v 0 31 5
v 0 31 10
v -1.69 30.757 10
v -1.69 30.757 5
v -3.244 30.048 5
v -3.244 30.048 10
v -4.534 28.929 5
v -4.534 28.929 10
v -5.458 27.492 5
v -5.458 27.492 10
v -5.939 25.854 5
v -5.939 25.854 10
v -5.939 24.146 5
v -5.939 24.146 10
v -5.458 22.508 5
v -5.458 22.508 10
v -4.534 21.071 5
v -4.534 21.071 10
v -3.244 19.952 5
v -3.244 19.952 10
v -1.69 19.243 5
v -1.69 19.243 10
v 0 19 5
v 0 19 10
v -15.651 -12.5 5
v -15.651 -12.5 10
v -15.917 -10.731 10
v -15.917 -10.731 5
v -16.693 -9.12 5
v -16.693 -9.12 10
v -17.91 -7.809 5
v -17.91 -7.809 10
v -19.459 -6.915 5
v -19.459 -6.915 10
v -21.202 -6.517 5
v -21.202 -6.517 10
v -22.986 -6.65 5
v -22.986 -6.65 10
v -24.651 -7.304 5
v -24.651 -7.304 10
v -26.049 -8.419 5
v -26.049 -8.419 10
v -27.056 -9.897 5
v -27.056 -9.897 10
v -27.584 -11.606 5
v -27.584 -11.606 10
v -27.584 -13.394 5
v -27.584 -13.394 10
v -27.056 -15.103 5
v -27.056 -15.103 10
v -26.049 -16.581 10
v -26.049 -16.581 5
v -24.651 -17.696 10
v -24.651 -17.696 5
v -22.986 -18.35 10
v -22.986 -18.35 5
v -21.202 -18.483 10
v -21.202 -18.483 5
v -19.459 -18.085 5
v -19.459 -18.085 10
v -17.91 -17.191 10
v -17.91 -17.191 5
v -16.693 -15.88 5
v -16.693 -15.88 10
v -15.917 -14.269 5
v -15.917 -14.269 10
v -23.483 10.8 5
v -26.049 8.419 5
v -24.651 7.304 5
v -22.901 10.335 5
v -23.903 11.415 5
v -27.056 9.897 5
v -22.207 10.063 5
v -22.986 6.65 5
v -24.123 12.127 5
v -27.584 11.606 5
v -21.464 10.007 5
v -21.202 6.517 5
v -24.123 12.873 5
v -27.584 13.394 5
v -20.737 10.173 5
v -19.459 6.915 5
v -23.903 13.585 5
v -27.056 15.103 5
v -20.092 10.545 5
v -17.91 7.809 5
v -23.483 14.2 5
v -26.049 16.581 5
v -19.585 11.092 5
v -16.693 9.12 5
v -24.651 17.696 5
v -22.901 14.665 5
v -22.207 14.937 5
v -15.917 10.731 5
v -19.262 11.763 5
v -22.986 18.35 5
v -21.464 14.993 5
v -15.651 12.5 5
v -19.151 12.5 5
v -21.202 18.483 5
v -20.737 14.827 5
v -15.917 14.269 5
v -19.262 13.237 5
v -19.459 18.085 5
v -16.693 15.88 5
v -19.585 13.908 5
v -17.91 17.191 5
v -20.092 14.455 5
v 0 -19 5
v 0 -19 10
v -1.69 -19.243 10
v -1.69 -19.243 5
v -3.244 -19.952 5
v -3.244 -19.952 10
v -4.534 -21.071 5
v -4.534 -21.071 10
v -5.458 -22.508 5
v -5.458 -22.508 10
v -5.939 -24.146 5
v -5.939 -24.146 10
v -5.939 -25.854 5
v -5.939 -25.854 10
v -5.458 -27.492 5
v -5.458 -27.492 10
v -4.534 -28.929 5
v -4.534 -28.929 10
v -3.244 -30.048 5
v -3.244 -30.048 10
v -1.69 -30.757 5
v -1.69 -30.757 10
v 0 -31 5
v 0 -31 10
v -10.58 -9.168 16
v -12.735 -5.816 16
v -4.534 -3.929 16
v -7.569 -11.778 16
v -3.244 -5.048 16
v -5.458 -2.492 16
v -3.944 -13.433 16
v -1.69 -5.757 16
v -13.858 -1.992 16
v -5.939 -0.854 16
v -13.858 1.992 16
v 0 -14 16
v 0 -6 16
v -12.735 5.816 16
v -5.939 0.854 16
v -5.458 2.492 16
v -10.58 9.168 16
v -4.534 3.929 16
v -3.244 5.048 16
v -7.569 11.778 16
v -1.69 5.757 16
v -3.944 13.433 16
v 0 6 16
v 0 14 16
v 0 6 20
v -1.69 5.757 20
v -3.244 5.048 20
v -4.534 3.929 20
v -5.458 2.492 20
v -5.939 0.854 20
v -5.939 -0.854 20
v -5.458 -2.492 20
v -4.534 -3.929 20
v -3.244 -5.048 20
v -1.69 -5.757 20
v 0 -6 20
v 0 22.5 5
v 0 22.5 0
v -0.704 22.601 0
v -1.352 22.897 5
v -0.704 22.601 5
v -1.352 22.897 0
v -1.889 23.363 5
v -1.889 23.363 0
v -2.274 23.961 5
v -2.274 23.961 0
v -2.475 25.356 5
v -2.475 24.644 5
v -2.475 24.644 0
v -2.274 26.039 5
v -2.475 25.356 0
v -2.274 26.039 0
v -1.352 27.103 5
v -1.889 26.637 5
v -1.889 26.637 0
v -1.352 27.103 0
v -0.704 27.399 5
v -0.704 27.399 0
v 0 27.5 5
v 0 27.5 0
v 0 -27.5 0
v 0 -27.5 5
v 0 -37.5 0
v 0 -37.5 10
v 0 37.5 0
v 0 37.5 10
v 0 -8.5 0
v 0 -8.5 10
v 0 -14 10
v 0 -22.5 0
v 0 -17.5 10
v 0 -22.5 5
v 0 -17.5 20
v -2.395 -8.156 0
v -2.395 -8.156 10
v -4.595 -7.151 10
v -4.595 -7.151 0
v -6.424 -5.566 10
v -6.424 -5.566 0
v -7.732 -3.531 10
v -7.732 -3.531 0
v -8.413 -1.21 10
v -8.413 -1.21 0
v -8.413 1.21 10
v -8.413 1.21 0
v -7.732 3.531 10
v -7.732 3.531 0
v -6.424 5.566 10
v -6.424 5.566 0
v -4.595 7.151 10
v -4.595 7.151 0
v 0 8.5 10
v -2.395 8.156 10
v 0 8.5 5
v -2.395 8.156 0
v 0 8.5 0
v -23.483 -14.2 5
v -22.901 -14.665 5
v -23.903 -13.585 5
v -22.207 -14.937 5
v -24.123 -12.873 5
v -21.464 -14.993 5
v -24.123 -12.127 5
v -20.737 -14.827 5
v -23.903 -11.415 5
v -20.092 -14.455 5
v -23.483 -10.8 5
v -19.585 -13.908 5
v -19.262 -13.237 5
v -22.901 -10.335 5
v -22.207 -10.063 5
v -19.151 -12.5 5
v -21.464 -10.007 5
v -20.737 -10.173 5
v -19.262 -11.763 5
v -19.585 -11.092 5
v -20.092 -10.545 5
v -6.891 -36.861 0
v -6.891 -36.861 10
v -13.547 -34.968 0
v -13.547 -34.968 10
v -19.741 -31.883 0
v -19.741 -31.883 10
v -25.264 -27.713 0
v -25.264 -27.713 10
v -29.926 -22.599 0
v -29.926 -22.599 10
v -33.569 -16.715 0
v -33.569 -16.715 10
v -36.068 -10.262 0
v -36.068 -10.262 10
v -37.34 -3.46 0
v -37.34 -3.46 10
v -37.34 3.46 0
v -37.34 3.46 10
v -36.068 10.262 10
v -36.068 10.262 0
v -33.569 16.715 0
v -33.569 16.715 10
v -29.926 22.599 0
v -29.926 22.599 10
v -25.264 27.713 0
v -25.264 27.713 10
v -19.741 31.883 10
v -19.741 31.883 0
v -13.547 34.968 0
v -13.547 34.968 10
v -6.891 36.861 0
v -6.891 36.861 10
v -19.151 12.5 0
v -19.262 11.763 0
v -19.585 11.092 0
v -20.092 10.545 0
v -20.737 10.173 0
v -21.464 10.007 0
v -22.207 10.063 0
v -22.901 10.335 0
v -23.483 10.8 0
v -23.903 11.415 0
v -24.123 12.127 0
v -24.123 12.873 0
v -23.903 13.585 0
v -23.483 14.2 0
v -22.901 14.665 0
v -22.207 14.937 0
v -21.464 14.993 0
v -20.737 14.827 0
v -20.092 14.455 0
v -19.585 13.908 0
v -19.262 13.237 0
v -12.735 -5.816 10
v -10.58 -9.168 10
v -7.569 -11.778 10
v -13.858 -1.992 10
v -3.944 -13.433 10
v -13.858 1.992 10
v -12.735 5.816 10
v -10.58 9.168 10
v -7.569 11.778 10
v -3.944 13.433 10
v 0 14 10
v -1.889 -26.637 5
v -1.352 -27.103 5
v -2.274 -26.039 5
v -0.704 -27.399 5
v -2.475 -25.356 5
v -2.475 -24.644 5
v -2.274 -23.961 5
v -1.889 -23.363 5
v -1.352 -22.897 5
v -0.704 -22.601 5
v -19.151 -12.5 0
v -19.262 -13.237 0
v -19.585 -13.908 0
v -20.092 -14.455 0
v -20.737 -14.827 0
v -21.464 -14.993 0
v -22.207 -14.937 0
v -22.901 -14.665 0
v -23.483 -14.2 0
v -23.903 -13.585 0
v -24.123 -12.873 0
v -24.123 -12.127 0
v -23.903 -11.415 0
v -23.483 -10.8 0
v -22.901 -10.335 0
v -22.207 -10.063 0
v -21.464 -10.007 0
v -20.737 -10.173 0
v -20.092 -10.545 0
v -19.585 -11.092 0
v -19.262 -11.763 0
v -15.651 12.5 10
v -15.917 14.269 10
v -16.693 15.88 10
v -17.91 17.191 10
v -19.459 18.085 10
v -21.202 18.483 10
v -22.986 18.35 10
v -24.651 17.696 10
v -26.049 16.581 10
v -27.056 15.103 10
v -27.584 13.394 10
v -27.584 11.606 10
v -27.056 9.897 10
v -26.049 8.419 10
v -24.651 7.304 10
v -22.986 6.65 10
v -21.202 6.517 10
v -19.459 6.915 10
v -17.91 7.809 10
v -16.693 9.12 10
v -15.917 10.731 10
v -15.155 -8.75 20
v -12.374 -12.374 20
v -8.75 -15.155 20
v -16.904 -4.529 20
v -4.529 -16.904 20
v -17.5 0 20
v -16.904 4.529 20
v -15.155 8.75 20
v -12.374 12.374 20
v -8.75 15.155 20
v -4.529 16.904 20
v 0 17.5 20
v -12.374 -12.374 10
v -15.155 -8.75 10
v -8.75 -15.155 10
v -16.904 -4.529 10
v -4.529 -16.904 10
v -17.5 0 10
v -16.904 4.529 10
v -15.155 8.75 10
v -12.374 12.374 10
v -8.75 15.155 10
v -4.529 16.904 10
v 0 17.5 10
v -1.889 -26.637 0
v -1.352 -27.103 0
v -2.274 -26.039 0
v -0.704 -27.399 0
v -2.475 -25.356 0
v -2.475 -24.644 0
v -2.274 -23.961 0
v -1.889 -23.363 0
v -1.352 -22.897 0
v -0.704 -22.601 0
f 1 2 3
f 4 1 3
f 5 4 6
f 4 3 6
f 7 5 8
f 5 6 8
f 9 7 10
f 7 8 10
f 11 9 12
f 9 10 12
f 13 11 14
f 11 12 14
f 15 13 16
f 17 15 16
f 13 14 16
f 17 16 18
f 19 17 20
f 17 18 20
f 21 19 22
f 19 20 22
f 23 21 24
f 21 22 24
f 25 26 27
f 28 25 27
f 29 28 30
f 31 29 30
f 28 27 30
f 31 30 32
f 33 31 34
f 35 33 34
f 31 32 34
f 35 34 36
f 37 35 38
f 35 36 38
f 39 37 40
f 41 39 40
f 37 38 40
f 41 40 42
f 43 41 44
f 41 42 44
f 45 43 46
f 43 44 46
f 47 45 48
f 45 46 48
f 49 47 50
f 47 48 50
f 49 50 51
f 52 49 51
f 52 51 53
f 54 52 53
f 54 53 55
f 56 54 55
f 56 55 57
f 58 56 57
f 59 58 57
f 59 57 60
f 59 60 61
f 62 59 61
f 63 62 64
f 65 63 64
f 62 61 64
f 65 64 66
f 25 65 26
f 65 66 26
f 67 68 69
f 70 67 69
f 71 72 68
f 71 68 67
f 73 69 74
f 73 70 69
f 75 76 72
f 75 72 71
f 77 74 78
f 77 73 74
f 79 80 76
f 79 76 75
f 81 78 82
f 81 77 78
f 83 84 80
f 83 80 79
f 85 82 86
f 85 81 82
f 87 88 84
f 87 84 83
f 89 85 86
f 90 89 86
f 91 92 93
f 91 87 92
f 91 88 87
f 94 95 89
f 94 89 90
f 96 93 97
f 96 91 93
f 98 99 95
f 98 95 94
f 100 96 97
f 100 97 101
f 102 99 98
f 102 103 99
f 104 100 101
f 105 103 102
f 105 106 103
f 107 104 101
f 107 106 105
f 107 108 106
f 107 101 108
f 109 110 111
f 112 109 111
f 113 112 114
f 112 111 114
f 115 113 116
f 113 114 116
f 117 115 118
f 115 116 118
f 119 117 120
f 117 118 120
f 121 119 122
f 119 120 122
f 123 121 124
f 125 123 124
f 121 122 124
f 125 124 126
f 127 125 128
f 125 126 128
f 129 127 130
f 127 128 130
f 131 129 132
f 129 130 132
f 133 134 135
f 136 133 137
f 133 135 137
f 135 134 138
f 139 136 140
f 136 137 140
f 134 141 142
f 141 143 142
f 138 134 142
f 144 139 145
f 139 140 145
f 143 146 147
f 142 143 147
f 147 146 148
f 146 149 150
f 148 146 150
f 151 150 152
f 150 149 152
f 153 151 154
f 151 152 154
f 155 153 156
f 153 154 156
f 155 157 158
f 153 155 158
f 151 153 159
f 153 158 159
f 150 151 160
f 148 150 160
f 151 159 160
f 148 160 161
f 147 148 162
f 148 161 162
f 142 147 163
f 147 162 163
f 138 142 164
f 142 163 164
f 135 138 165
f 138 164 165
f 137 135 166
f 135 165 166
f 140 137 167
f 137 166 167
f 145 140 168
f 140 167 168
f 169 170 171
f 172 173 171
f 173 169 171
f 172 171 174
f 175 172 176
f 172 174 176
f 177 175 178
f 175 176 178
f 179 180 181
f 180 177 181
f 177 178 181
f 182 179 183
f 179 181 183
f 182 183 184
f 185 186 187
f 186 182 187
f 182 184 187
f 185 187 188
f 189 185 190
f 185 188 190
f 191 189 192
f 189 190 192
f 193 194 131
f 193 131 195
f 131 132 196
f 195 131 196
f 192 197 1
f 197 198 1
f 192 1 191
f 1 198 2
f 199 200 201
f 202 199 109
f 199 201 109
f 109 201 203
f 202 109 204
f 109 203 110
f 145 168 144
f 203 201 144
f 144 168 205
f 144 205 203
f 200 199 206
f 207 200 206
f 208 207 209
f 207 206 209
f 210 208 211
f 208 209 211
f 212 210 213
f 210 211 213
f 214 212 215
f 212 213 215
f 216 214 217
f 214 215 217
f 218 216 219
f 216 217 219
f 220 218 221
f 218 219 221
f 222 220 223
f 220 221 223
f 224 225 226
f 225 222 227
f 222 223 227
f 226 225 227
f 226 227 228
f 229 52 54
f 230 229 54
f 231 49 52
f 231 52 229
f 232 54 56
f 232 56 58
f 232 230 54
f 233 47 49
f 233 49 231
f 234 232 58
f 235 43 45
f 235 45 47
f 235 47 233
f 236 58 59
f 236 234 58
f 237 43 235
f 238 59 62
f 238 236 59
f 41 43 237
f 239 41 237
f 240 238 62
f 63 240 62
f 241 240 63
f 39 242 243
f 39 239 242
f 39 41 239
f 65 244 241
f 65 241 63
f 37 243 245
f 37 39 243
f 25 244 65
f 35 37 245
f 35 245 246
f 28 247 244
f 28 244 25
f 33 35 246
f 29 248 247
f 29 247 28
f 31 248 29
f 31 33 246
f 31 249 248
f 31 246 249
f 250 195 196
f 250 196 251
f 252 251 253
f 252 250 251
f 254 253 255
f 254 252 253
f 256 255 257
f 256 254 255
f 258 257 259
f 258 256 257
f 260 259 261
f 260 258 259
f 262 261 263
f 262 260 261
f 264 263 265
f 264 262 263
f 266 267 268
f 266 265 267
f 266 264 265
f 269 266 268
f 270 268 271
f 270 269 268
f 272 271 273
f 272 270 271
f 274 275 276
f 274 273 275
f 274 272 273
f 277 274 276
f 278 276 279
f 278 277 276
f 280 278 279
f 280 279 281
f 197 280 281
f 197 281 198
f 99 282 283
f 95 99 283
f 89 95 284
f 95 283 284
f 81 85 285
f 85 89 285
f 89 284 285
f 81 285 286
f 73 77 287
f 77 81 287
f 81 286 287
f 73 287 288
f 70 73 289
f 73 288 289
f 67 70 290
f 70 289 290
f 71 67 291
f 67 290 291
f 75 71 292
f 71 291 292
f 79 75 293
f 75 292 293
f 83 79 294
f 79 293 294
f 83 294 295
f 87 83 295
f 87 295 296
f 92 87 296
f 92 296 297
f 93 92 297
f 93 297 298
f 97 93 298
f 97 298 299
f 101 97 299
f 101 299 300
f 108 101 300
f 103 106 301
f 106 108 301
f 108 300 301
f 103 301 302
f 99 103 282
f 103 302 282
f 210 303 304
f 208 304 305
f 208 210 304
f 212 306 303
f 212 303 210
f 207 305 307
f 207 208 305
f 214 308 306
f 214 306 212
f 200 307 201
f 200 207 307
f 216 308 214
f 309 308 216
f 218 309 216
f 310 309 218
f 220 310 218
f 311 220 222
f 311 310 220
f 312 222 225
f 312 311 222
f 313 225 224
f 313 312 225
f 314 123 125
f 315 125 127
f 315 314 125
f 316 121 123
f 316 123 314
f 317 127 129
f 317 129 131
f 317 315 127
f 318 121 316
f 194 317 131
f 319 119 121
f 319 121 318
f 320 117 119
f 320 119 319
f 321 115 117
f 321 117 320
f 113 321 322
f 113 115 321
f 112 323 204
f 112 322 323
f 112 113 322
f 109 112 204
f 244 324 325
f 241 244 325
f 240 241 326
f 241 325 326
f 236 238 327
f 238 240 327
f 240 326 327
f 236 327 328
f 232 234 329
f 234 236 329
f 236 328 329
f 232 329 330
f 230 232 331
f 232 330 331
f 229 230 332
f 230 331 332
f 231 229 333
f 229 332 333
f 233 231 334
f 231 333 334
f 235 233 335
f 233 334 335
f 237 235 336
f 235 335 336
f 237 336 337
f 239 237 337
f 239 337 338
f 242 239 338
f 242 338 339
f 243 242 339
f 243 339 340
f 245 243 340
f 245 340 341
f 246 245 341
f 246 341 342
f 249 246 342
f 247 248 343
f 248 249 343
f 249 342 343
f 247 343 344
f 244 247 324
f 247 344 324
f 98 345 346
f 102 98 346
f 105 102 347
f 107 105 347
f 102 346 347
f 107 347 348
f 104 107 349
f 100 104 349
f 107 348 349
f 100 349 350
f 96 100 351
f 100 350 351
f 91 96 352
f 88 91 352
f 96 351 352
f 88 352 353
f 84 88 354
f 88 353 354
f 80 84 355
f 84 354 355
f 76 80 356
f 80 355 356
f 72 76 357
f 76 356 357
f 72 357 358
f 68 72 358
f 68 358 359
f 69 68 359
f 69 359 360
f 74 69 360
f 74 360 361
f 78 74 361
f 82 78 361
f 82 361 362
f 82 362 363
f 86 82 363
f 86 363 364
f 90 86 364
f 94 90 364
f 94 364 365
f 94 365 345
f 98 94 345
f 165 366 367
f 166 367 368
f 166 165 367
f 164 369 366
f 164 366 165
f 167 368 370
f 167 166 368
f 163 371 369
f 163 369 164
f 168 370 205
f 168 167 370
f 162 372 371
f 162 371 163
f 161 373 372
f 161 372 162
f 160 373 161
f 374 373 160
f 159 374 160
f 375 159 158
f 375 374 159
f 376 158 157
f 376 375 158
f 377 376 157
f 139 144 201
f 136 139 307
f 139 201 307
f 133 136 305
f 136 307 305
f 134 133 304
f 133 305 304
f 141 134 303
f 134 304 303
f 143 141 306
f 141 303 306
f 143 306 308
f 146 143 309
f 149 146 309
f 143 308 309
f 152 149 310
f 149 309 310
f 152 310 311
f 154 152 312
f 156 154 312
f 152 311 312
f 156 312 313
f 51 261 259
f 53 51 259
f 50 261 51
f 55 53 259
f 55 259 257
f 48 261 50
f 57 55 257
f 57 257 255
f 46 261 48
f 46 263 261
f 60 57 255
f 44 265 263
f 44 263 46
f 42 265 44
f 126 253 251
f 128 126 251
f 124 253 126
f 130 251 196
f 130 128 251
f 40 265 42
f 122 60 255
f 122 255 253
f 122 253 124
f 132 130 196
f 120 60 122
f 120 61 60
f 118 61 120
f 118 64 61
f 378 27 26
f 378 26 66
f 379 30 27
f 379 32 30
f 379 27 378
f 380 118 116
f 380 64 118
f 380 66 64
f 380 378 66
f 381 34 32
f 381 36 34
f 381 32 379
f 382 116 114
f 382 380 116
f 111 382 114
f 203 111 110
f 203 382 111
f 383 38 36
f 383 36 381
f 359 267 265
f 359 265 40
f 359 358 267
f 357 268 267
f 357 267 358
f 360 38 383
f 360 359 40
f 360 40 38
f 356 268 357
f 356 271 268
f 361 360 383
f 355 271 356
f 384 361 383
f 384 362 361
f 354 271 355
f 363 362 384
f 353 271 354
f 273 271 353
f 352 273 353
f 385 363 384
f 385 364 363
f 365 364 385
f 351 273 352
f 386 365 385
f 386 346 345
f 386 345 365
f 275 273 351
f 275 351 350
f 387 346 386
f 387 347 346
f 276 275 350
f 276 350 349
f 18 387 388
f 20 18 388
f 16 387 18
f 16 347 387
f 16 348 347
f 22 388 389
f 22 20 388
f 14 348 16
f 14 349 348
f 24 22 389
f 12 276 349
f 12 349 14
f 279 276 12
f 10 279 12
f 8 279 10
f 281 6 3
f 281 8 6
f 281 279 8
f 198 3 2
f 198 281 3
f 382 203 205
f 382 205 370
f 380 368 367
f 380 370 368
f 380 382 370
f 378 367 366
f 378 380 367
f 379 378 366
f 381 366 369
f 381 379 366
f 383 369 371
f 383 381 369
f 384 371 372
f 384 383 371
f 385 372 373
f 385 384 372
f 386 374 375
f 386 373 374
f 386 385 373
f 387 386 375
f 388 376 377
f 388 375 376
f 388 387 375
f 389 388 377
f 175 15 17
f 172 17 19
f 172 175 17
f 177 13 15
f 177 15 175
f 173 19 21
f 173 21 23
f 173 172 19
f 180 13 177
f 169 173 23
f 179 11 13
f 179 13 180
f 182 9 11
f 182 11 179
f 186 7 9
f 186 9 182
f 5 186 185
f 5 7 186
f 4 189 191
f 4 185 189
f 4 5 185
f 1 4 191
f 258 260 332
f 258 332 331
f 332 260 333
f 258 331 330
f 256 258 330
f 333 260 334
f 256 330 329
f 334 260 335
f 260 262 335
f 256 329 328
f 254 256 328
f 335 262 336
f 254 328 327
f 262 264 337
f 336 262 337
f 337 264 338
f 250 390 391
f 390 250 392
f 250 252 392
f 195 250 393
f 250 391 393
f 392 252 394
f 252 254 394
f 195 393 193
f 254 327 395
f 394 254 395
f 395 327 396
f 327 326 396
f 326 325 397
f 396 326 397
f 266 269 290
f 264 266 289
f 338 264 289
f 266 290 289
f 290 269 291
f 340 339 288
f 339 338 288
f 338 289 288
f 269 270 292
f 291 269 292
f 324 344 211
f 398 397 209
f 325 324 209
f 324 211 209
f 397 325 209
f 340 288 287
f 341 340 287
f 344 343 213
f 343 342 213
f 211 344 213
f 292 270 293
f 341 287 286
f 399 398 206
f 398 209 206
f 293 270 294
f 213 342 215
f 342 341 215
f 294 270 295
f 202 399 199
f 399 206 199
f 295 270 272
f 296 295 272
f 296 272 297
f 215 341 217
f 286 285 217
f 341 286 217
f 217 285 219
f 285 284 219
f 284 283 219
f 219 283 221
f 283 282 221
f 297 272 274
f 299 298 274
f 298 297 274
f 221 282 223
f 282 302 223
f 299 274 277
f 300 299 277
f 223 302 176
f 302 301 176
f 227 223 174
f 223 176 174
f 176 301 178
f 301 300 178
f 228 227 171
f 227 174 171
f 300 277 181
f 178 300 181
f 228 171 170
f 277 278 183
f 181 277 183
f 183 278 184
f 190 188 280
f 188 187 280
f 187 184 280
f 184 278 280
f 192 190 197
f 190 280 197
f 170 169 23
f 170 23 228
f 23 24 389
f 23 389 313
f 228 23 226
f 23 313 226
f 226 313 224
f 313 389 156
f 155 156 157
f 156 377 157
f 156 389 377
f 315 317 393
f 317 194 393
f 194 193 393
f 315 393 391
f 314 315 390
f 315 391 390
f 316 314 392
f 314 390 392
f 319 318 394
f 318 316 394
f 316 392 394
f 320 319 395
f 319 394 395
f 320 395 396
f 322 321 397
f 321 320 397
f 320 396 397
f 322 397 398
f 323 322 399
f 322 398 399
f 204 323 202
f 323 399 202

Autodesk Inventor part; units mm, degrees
ref_plane "YZ Plane" through (0, 0, 0) normal (1, 0, 0) x (0, 1, 0)
ref_plane "XZ Plane" through (0, 0, 0) normal (0, 1, 0) x (-1, 0, 0)
ref_plane "XY Plane" through (0, 0, 0) normal (0, 0, 1) x (1, 0, 0)
sketch "Sketch1" plane through (0, 0, 0) normal (0, 0, 1) x (1, 0, 0)
  circle A0 centre (0, 0) radius 37.5
  circle A1 centre (0, 25) radius 2.5
  circle A2 centre (0, 0) radius 25 construction
  circle A3 centre (-21.6506, 12.5) radius 2.5
  circle A4 centre (-21.6506, -12.5) radius 2.5
  circle A5 centre (0, -25) radius 2.5
  circle A6 centre (21.6506, -12.5) radius 2.5
  circle A7 centre (21.6506, 12.5) radius 2.5
  circle A8 centre (0, 0) radius 2.5
  dimension "d2" = 50
  dimension "d0" = 75
  dimension "d1" = 5
  dimension "d5" = 360
  dimension "d7" = 5
extrude "Extrusion1" add sketch "Sketch1" along normal blind 10
sketch "Sketch4" plane through (0, 0, 10) normal (0, 0, 1) x (1, 0, 0)
  circle A0 centre (0, 0) radius 2.5 projected
  circle A1 centre (21.6506, 12.5) radius 2.5 projected
  circle A2 centre (21.6506, -12.5) radius 2.5 projected
  circle A3 centre (0, -25) radius 2.5 projected
  circle A4 centre (-21.6506, -12.5) radius 2.5 projected
  circle A5 centre (-21.6506, 12.5) radius 2.5 projected
  circle A6 centre (0, 25) radius 2.5 projected
  circle A7 centre (0, 0) radius 37.5 projected
  circle A8 centre (0, 25) radius 6
  circle A9 centre (-21.6506, 12.5) radius 6
  circle A10 centre (-21.6506, -12.5) radius 6
  circle A11 centre (0, -25) radius 6
  circle A12 centre (21.6506, -12.5) radius 6
  circle A13 centre (21.6506, 12.5) radius 6
  dimension "d17" = 12
  dimension "d20" = 360
extrude "Extrusion4" cut sketch "Sketch4" against normal blind 5 contours A8 | A9 | A10 | A11 | A12 | A13
sketch "Sketch5" plane through (0, 0, 0) normal (0, 0, -1) x (-1, 0, 0)
  circle A0 centre (0, 0) radius 2.5 projected
  circle A1 centre (0, 0) radius 8.5
  dimension "d24" = 17
extrude "Extrusion5" cut sketch "Sketch5" against normal blind 5
sketch "Sketch6" plane through (0, 0, 10) normal (0, 0, 1) x (1, 0, 0)
  circle A0 centre (0, 0) radius 2.5 projected
  circle A1 centre (0, 0) radius 14
  circle A2 centre (0, 0) radius 17.5
  dimension "d35" = 35
  dimension "d36" = 28
extrude "Extrusion6" add sketch "Sketch6" along normal blind 10 contours A2
sketch "Sketch7" plane through (0, 0, 20) normal (0, 0, 1) x (1, 0, 0)
  circle A0 centre (0, 0) radius 6
  circle A1 centre (0, 0) radius 2.5
  circle A2 centre (0, 0) radius 17.5
  circle A3 centre (0, 0) radius 17.5 projected
  dimension "d40" = 12
extrude "Extrusion7" add sketch "Sketch7" against normal blind 4 contours A2
sketch "Sketch8" plane through (0, 0, 20) normal (0, 0, 1) x (1, 0, 0)
  circle A0 centre (0, 0) radius 37.5 projected
  line L0 (0, -37.5) -> (37.5, -37.5)
  line L1 (37.5, -37.5) -> (37.5, 37.5)
  line L2 (37.5, 37.5) -> (0, 37.5)
  line L3 (0, 37.5) -> (0, -37.5)
  point P0 (37.5, 0)
extrude "Extrusion8" cut sketch "Sketch8" against normal through all contours A0 L3 | L1 L0 A0 | A0 L2 L1 picked at (9.7729, 7.7936)
sketch "Sketch9" plane through (0, 0, 5) normal (0, 0, -1) x (-1, 0, 0)
  arc A0 (0, 14) -> (0, -14) centre (0, 0) ccw projected
  circle A1 centre (0, 0) radius 8.5 construction
  arc A2 (0, -14) -> (0, 14) centre (0, 0) ccw projected
  line L0 (0, 14) -> (-0.0015, 8.5)
  line L1 (0, -14) -> (0, -8.5)
  line L2 (0, -6) -> (0, -14) projected
  arc A3 (0, -8.5) -> (-0.0015, 8.5) centre (0, 0) ccw
  line L3 (0, 8.5) -> (0, 2.5) projected
  dimension "d39" = 17
extrude "Extrusion9" cut sketch "Sketch9" against normal blind 5 contours L0 A3 L1 A0
properties part number "BA008" material "ABS Plastic"
